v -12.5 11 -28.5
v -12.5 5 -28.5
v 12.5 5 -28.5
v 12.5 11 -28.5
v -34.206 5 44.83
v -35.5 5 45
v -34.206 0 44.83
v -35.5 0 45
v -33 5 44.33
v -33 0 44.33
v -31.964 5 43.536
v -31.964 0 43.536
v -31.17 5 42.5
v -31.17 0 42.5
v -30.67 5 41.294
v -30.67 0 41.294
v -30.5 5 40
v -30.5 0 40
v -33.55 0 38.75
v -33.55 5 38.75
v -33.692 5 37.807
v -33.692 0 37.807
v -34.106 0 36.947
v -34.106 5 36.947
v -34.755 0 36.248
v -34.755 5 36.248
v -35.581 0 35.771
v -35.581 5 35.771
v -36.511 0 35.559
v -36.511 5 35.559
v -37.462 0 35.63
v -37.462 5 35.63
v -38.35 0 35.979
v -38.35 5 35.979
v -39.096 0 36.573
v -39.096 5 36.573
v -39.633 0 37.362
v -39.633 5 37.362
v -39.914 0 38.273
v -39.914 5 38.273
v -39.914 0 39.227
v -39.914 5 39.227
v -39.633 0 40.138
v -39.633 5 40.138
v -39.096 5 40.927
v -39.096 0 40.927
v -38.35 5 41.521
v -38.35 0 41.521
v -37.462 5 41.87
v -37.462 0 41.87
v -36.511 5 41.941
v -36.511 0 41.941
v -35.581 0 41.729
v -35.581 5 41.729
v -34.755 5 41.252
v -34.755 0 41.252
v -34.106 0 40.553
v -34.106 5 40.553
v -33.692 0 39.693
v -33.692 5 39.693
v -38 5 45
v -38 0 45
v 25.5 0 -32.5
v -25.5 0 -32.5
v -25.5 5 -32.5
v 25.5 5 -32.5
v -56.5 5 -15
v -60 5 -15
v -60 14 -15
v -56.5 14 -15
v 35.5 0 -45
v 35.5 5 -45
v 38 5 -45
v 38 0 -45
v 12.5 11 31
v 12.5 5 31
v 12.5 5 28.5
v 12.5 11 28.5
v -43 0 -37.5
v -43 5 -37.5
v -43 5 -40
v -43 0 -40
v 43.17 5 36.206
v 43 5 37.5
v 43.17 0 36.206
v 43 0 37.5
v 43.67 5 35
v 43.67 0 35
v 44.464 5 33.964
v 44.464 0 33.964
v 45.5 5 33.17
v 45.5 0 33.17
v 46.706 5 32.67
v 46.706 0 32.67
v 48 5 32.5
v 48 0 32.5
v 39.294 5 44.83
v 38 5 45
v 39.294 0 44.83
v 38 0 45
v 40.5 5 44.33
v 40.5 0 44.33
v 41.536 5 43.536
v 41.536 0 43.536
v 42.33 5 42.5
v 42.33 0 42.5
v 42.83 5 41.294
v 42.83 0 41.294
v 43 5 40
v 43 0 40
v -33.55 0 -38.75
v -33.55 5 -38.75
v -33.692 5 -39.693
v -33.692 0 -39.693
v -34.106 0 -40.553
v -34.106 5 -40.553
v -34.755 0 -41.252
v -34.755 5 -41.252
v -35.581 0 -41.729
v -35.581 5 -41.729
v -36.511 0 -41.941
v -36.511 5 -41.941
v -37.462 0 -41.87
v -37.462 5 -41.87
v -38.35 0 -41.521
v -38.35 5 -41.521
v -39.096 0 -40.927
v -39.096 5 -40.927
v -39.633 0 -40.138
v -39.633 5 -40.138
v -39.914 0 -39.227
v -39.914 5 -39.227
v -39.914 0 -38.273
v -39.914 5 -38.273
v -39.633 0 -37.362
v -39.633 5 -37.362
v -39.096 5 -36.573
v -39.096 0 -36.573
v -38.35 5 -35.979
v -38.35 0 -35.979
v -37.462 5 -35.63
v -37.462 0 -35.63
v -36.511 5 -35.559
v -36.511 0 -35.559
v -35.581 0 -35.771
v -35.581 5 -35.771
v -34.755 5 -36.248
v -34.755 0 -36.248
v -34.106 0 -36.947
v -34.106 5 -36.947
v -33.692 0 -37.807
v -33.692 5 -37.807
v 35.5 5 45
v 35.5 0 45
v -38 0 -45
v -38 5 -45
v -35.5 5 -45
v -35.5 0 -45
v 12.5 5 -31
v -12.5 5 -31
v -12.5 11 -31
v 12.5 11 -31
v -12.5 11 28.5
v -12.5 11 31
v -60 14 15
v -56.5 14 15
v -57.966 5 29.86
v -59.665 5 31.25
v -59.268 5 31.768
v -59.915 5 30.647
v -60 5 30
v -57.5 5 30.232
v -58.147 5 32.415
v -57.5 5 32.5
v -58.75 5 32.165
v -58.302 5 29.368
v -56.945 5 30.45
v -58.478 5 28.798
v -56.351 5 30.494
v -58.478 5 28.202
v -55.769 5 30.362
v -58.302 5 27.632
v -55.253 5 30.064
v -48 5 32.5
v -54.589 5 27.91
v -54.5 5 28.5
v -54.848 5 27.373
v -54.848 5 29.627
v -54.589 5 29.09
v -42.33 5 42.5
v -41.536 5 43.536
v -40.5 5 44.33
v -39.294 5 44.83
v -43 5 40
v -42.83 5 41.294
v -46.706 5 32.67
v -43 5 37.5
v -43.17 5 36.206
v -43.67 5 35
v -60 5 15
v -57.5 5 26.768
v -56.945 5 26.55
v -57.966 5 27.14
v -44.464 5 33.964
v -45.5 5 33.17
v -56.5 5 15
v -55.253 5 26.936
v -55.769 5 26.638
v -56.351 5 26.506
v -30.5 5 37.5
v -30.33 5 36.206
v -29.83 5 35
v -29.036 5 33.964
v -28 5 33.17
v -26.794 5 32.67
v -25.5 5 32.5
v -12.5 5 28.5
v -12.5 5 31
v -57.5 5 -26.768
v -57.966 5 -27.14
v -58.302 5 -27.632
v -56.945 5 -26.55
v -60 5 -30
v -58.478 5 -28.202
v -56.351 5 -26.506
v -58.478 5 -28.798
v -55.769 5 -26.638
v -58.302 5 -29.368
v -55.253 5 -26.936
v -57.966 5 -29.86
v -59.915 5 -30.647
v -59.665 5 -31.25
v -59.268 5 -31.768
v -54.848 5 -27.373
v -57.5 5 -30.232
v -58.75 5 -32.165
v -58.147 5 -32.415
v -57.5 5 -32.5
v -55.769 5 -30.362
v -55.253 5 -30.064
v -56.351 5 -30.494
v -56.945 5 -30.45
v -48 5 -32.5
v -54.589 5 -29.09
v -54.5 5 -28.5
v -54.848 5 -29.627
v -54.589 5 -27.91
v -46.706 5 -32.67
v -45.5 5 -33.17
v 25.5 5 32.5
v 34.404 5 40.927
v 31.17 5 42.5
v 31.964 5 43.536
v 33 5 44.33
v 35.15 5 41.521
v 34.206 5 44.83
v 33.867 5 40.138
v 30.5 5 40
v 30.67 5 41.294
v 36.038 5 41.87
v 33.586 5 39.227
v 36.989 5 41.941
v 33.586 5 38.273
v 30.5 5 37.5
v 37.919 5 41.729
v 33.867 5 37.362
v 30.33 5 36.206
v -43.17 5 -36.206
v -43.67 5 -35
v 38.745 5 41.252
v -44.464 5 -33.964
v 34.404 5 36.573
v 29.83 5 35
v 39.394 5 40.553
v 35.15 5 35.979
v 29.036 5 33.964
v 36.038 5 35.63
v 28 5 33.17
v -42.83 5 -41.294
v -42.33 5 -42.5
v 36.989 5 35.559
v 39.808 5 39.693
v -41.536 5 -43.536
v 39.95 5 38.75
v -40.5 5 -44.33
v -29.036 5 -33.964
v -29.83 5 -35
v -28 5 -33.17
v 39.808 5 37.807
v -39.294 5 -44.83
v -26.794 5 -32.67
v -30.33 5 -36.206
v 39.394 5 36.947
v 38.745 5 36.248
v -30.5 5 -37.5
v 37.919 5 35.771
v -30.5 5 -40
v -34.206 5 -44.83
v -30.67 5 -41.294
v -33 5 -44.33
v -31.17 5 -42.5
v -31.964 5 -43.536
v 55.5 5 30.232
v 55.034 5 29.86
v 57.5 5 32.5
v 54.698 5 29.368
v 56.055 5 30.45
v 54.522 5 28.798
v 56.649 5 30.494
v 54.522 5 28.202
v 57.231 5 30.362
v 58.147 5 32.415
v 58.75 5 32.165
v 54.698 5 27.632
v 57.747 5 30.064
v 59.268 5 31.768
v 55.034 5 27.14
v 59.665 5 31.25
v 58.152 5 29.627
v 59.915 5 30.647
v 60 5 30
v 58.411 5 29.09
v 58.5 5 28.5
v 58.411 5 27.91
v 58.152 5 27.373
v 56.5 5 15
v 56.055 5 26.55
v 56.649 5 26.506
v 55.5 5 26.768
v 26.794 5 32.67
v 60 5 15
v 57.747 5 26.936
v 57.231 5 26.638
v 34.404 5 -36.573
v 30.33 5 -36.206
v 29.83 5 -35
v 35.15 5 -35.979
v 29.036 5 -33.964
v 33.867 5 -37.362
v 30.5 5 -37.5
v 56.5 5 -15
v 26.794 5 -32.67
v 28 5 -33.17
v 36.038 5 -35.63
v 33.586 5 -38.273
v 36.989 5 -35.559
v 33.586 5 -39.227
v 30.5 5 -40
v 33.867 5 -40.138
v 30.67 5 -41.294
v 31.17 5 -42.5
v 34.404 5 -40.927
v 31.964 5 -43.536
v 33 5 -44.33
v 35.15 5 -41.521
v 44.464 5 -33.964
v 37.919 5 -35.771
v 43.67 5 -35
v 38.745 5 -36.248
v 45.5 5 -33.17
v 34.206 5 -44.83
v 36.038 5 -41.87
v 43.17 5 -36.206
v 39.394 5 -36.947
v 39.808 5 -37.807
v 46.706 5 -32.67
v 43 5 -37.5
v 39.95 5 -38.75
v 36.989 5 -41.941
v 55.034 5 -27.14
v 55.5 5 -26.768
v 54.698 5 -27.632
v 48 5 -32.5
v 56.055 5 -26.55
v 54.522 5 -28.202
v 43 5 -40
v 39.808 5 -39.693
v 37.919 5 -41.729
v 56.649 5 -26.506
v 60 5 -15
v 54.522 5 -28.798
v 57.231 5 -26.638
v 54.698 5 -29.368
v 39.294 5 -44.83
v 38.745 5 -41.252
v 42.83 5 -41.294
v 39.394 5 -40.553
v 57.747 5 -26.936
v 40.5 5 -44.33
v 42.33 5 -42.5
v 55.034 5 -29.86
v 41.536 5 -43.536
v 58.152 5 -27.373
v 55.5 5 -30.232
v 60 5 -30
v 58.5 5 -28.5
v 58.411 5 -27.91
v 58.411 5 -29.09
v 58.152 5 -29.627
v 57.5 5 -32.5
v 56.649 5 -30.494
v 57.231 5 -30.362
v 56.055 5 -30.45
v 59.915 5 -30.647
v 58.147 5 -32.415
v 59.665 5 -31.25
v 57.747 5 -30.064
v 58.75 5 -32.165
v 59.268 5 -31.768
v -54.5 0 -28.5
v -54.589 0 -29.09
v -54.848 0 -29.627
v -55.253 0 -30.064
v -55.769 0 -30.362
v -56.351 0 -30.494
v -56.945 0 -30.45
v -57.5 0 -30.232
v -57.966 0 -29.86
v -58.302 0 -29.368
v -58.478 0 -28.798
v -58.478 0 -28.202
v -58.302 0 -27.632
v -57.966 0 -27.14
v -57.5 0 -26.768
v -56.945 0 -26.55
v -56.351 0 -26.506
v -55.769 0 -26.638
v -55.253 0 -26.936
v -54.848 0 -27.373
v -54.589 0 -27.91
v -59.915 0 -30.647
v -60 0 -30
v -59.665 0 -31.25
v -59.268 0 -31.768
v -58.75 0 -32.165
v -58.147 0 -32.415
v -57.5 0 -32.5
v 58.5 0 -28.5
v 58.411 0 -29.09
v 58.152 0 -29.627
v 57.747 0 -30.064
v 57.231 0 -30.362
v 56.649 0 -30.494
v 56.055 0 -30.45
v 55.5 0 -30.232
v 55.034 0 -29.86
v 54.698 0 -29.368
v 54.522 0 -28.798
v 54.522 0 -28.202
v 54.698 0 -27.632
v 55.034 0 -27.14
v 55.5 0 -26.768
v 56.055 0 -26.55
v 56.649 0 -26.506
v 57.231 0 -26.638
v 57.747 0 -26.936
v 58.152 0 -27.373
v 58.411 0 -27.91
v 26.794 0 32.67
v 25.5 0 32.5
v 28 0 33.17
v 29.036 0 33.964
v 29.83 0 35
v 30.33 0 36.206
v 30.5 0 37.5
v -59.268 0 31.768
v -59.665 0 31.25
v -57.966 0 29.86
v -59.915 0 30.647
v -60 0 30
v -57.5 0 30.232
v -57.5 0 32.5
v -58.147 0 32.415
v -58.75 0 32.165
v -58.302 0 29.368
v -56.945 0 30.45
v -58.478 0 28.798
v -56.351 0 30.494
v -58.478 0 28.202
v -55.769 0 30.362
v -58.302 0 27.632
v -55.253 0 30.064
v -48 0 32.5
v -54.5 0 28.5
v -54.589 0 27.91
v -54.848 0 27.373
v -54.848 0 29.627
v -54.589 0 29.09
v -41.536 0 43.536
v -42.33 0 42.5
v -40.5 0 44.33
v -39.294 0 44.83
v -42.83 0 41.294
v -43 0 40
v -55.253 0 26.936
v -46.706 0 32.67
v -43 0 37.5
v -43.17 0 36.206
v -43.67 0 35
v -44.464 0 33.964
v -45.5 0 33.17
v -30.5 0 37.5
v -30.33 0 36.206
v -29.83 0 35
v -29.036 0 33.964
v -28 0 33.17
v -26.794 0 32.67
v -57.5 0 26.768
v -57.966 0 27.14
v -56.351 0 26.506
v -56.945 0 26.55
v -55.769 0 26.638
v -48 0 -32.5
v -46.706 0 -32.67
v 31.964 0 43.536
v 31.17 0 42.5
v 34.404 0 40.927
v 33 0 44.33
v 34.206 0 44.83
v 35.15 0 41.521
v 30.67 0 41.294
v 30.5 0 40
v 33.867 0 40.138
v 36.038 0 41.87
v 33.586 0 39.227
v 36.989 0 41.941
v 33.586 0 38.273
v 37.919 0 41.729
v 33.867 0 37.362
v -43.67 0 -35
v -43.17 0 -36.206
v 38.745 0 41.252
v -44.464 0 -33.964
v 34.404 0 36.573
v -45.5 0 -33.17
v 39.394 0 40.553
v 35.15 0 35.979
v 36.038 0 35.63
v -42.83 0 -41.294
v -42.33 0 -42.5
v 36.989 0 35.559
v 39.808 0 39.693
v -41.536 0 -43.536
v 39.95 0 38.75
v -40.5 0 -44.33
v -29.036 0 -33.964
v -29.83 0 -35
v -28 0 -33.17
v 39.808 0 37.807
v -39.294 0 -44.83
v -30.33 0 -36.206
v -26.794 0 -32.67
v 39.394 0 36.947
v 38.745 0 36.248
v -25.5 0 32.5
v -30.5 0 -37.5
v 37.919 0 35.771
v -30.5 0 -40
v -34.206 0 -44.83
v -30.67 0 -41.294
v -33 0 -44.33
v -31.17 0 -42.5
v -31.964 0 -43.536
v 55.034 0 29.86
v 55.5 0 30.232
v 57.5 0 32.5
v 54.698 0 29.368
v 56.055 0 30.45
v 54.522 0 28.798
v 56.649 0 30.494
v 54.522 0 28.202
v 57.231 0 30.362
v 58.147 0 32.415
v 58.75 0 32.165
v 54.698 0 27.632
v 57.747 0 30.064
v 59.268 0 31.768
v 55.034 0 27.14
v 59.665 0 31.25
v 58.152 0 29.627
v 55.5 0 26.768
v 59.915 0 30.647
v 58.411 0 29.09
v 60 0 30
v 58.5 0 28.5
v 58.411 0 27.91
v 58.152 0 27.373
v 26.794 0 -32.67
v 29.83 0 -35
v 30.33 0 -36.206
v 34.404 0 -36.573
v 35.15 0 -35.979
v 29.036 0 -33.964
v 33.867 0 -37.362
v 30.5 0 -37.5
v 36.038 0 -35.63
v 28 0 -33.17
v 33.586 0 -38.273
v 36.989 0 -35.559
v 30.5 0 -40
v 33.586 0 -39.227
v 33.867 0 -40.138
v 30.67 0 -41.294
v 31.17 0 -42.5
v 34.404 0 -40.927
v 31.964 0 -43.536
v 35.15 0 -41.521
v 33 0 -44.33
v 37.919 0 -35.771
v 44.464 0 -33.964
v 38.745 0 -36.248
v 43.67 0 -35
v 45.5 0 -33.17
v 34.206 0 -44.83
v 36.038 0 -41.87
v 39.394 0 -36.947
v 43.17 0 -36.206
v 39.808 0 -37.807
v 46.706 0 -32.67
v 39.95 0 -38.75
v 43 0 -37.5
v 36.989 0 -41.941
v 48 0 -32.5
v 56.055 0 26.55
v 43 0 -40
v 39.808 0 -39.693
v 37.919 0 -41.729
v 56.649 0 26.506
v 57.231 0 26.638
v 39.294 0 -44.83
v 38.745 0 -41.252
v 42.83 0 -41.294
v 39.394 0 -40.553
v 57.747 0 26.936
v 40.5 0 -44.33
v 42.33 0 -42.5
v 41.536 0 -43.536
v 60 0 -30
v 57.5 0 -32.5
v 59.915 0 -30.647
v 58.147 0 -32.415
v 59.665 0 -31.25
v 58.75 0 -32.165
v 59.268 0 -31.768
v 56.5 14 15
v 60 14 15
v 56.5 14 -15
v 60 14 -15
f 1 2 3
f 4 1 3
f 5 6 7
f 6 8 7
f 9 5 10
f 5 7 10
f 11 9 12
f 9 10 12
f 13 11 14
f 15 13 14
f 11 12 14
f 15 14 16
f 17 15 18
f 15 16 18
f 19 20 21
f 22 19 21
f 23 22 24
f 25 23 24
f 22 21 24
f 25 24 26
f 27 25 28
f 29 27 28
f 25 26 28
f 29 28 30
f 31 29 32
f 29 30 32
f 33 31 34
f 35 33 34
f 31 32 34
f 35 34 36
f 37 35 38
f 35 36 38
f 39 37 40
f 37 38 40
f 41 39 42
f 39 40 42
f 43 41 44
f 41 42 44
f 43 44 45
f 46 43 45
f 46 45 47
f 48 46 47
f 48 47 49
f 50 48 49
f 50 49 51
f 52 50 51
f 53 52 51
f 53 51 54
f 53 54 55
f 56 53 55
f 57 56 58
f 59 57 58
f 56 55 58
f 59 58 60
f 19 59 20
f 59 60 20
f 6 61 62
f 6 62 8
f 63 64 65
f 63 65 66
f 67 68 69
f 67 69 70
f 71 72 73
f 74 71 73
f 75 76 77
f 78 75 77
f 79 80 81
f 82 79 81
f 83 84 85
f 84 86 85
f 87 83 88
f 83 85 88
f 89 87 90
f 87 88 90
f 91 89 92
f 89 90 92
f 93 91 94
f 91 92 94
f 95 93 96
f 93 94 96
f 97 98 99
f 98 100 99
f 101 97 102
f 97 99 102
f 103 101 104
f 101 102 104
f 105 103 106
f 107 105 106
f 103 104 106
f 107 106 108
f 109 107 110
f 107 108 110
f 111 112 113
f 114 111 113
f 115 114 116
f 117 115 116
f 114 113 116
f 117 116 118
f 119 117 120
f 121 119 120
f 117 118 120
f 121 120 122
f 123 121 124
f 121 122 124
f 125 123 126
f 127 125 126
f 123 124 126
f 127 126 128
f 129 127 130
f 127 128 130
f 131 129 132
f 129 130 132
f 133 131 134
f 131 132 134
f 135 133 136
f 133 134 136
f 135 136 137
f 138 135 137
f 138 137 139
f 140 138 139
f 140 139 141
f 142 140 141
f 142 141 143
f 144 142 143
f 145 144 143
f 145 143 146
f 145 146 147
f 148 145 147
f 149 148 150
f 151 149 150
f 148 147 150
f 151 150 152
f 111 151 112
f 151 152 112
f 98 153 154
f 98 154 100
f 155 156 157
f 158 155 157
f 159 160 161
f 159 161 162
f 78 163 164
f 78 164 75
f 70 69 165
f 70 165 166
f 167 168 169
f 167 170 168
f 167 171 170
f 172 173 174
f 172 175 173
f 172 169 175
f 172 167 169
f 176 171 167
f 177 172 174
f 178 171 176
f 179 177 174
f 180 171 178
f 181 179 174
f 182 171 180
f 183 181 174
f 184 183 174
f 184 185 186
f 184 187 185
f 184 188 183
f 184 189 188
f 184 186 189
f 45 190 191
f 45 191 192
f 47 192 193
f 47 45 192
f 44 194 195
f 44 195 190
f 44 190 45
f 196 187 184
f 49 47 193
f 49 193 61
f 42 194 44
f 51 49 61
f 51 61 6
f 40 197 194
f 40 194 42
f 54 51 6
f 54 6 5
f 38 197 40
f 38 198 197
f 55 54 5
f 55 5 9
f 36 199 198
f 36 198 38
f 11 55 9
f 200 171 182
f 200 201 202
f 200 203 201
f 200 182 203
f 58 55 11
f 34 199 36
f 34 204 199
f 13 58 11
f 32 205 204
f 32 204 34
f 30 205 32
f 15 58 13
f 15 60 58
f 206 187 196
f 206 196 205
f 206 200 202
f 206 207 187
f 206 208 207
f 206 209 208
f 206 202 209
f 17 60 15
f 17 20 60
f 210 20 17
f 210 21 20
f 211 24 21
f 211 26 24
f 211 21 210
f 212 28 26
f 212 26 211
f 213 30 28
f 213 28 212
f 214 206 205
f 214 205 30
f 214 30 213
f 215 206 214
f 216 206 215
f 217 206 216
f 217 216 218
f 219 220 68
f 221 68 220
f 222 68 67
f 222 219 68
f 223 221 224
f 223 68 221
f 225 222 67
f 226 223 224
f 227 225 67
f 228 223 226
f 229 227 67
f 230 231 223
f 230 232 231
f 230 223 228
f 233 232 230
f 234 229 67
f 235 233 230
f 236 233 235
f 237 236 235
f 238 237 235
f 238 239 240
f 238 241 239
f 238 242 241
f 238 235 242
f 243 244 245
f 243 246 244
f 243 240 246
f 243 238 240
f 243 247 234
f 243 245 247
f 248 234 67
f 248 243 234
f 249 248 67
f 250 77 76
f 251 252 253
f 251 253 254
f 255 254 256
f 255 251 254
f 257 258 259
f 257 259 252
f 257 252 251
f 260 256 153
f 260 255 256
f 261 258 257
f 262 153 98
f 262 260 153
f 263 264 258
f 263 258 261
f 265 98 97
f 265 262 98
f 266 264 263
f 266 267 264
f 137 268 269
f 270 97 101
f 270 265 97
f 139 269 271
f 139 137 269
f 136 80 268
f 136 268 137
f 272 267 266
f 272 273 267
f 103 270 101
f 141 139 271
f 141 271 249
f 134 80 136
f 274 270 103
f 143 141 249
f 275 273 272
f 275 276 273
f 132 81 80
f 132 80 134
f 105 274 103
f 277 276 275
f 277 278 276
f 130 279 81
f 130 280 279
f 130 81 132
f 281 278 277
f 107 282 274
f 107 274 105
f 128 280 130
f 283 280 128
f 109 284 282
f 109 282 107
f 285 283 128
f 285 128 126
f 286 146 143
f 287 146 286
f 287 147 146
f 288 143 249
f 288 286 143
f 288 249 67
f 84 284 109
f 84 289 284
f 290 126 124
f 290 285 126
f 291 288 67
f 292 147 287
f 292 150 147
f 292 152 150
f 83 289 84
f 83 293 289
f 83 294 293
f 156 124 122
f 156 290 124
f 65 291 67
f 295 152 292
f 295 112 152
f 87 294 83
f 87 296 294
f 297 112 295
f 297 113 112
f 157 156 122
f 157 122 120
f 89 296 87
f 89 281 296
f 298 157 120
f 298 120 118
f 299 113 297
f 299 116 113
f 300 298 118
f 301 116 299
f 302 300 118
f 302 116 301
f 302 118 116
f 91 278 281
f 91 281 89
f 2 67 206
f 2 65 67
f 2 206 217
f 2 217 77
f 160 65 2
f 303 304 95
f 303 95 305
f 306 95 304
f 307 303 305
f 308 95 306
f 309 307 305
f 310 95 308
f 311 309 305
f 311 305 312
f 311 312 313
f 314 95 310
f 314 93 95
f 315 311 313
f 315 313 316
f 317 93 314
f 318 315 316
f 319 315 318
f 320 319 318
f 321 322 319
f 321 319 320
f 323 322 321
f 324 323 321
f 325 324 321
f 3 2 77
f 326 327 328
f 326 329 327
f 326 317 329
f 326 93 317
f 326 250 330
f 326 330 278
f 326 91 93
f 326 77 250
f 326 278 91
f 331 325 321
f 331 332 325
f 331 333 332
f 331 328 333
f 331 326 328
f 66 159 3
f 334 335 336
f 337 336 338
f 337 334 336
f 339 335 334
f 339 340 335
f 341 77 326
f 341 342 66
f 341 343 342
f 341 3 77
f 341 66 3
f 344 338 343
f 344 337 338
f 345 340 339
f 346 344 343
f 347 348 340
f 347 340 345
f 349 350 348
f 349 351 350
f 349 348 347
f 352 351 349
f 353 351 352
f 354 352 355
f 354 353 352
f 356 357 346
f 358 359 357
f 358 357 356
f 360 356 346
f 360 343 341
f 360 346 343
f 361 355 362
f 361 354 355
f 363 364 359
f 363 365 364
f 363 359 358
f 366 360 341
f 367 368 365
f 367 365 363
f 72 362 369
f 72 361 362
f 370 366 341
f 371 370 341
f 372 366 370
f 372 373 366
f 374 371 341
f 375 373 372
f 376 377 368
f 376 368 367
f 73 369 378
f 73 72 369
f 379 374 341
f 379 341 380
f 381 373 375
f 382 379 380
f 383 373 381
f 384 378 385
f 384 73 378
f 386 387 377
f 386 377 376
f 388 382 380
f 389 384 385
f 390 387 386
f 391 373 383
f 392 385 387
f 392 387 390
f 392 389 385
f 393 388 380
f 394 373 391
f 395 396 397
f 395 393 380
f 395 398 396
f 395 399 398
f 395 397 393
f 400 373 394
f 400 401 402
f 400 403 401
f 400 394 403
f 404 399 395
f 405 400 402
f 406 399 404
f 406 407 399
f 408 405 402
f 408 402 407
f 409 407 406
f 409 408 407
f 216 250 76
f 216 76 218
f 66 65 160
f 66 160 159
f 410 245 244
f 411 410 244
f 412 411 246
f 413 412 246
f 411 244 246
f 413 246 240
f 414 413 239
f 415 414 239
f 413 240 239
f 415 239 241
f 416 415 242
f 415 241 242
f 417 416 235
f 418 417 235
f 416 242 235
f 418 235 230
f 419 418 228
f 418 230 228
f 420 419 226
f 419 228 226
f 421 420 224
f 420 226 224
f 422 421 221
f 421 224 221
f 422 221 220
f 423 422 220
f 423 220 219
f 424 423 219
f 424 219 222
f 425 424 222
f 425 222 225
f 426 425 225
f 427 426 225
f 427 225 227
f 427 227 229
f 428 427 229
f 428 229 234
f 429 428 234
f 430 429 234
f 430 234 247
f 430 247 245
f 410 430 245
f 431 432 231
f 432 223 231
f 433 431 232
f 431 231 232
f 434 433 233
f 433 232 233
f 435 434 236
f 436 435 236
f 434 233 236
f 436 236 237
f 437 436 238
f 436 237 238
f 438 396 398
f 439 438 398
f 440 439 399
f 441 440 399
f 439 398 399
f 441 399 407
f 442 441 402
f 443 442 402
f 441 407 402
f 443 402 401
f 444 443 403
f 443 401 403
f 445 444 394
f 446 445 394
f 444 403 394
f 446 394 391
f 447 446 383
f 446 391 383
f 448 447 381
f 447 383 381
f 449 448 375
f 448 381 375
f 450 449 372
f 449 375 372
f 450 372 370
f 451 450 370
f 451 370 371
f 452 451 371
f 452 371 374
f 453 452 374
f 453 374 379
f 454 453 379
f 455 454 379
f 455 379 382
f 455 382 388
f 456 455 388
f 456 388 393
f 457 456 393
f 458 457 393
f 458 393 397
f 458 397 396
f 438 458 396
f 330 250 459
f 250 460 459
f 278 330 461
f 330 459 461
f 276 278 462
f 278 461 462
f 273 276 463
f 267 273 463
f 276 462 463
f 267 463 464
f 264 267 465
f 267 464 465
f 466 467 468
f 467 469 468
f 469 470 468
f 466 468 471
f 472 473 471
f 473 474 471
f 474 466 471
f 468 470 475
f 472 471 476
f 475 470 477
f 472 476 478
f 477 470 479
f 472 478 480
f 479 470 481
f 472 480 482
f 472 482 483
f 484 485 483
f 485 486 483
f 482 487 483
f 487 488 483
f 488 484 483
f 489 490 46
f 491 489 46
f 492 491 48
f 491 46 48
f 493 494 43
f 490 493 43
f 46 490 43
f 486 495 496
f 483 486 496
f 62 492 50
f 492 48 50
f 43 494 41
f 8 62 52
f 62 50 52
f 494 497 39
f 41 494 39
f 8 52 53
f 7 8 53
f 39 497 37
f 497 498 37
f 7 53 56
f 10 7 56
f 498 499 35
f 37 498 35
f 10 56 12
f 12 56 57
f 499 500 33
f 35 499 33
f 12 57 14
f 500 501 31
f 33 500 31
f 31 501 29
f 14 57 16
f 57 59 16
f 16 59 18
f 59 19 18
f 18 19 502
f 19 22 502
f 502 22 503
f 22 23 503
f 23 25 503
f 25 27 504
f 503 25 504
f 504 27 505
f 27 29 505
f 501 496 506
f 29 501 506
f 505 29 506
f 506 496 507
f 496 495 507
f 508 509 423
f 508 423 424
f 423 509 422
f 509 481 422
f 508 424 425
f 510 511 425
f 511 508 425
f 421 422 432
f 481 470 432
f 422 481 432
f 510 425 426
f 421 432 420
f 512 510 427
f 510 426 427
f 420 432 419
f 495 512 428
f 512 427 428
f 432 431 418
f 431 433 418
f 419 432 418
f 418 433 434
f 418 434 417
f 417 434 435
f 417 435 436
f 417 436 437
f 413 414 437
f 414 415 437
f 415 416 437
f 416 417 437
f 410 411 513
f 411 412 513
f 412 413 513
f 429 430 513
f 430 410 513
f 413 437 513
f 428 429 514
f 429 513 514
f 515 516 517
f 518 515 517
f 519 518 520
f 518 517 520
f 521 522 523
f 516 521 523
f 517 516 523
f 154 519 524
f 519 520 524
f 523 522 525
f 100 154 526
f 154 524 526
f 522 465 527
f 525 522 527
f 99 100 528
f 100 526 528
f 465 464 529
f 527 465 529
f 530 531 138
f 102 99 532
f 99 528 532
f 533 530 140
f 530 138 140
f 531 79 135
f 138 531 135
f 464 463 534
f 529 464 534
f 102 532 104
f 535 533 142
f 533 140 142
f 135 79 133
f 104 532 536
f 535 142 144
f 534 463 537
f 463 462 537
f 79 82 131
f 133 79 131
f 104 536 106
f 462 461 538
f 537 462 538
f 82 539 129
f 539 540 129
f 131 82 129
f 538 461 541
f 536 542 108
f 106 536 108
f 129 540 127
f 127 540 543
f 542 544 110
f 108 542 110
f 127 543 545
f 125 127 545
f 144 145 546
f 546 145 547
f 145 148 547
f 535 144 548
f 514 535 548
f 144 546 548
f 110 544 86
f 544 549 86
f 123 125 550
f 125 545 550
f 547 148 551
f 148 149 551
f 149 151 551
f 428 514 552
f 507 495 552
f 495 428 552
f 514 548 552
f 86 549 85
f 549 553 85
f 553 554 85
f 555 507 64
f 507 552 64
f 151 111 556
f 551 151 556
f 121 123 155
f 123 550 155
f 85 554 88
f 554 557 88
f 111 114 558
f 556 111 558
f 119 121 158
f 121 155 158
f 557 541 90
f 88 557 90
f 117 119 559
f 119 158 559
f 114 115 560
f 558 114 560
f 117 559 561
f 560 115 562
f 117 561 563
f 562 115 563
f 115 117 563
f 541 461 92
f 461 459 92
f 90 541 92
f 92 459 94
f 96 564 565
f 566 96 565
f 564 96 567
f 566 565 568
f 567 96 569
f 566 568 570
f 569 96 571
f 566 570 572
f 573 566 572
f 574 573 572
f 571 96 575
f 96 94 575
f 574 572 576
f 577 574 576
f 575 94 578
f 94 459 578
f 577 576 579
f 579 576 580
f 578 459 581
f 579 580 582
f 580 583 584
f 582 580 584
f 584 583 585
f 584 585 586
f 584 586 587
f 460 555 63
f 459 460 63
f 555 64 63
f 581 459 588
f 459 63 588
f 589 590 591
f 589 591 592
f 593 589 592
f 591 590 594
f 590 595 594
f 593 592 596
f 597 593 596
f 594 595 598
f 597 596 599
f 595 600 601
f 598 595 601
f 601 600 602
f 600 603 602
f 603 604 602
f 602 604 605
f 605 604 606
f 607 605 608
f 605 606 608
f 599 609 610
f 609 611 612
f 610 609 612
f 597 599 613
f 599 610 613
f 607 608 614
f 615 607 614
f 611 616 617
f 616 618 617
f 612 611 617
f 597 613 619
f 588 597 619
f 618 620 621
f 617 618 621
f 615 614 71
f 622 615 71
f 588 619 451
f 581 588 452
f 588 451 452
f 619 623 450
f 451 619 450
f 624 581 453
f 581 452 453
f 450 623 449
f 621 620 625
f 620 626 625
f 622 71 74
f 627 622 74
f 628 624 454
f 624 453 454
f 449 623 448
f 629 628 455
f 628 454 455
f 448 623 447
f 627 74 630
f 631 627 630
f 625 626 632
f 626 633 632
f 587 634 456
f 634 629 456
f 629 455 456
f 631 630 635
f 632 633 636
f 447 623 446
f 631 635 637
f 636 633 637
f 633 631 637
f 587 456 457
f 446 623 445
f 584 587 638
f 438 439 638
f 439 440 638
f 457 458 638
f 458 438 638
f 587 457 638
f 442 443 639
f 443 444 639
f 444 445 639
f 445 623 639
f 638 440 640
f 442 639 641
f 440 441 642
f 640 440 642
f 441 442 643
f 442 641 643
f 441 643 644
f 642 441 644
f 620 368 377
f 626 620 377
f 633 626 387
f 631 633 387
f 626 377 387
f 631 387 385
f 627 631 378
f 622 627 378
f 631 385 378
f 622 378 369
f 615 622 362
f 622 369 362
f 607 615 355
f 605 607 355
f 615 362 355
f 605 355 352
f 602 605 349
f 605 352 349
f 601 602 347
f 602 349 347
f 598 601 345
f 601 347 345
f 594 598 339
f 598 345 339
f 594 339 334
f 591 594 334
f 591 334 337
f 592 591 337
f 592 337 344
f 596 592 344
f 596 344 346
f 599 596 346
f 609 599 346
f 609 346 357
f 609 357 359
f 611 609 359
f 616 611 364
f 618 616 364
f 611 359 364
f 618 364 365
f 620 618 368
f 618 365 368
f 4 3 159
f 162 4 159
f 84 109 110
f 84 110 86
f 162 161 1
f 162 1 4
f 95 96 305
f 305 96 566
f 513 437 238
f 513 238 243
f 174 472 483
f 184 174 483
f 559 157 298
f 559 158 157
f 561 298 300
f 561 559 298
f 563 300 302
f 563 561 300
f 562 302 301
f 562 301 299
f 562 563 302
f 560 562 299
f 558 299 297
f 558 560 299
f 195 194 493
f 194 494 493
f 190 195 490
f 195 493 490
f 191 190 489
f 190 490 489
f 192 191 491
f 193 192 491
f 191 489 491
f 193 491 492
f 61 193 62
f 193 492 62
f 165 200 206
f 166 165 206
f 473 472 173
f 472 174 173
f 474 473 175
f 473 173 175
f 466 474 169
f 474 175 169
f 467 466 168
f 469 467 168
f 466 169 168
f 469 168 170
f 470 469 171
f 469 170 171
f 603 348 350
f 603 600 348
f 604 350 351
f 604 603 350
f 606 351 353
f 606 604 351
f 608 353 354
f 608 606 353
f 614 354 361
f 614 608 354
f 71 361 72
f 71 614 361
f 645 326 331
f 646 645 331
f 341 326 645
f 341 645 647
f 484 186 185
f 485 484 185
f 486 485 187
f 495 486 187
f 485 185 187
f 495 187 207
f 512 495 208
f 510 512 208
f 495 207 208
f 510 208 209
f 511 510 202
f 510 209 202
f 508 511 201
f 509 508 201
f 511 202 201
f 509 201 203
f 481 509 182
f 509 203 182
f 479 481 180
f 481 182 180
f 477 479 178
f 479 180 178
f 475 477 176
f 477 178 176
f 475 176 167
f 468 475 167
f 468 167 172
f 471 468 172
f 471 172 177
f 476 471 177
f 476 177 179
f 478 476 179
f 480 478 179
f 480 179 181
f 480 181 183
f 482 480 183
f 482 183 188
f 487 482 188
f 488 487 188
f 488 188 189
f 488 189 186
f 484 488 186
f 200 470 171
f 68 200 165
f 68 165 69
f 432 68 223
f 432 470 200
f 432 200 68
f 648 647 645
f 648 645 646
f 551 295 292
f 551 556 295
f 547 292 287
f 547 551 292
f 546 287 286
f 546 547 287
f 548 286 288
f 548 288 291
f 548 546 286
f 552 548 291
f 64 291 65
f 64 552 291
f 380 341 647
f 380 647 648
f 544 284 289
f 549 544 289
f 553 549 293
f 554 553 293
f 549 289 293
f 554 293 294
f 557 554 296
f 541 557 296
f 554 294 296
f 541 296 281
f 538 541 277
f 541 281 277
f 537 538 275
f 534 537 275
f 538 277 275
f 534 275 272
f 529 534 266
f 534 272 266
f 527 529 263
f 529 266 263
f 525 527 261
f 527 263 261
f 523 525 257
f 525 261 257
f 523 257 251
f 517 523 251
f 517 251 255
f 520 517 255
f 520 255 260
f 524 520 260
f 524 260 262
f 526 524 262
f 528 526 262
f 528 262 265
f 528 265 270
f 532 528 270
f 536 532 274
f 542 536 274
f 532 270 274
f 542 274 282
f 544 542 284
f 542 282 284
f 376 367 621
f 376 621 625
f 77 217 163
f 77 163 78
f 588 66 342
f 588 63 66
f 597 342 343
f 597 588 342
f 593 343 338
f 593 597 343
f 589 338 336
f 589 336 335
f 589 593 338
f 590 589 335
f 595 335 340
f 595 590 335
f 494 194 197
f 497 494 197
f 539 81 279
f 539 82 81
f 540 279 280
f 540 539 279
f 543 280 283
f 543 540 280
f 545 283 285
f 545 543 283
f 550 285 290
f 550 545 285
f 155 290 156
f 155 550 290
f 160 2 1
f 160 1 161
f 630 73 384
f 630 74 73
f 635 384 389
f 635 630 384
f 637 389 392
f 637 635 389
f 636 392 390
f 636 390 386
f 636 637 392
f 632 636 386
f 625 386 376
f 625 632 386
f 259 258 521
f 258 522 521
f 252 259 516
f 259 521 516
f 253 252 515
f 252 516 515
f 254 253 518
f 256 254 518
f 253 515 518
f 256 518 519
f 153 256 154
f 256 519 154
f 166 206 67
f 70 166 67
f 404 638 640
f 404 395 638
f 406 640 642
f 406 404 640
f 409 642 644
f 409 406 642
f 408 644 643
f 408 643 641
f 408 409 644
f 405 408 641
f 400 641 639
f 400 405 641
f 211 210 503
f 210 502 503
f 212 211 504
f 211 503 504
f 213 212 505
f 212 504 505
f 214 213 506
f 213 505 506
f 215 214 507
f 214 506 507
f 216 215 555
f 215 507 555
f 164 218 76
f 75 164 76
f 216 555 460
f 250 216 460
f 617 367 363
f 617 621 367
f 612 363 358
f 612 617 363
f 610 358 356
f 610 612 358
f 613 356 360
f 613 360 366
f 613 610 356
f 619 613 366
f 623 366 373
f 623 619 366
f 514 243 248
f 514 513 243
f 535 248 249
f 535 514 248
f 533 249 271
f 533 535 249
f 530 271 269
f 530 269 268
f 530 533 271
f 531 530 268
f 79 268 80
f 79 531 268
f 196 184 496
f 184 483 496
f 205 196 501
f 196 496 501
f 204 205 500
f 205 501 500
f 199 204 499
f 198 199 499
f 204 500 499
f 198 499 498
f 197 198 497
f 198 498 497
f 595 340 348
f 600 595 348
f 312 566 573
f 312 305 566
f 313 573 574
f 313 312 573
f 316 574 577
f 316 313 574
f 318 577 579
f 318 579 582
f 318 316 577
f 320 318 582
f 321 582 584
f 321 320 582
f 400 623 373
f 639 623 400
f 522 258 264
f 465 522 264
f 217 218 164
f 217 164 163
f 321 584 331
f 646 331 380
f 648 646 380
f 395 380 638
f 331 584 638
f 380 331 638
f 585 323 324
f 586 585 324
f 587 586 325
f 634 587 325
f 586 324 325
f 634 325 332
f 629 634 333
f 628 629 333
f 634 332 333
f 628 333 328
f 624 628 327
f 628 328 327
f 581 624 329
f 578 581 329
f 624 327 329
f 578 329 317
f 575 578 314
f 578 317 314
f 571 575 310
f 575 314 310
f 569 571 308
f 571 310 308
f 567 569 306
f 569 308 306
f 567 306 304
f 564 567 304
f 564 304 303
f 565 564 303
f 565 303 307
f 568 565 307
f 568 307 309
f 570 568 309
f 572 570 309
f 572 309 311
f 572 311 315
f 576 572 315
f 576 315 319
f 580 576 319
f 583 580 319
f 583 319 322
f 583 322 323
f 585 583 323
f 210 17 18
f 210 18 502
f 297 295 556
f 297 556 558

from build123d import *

# Parameters (mm, degrees)
SKETCH_1_W          = 120
SKETCH_1_H          = 65
EXTRUDE_1_DEPTH     = 5
SKETCH_2_W          = 12.5
SKETCH_2_H          = 12.5
EXTRUDE_2_DEPTH     = 5
SKETCH_3_R          = 3.2
CUT_EXTRUDE_1_DEPTH = 5
SKETCH_4_W          = 3.5
SKETCH_4_H          = 30
EXTRUDE_3_DEPTH     = 9
FILLET_1_R          = 5
FILLET_2_R          = 2.5
SKETCH_5_W          = 25
SKETCH_5_H          = 2.5
EXTRUDE_4_DEPTH     = 6
SKETCH_6_R          = 2
CUT_EXTRUDE_2_DEPTH = 10


with BuildPart() as part:
    # 草图1 → 凸台-拉伸1 (new body)
    with BuildSketch(Plane(origin=(0, 0, 0), x_dir=(1, 0, 0), z_dir=(0, 1, 0))):
        Rectangle(SKETCH_1_W, SKETCH_1_H)
    extrude(amount=EXTRUDE_1_DEPTH)

    # 草图2 → 凸台-拉伸2 (add)
    with BuildSketch(Plane(origin=(0, 5, 0), x_dir=(1, 0, 0), z_dir=(0, 1, 0))):
        with Locations((-36.75, 38.75)):
            Rectangle(SKETCH_2_W, SKETCH_2_H)
        with Locations((36.75, 38.75)):
            Rectangle(SKETCH_2_W, SKETCH_2_H)
        with Locations((36.75, -38.75)):
            Rectangle(SKETCH_2_W, SKETCH_2_H)
        with Locations((-36.75, -38.75)):
            Rectangle(SKETCH_2_W, SKETCH_2_H)
    extrude(amount=-EXTRUDE_2_DEPTH)

    # 草图3 → 切除-拉伸1 (cut)
    with BuildSketch(Plane(origin=(0, 5, 0), x_dir=(1, 0, 0), z_dir=(0, 1, 0))):
        with Locations((-36.75, 38.75)):
            Circle(SKETCH_3_R)
        with Locations((36.75, 38.75)):
            Circle(SKETCH_3_R)
        with Locations((36.75, -38.75)):
            Circle(SKETCH_3_R)
        with Locations((-36.75, -38.75)):
            Circle(SKETCH_3_R)
    extrude(amount=-CUT_EXTRUDE_1_DEPTH, mode=Mode.SUBTRACT)

    # 草图4 → 凸台-拉伸3 (add)
    with BuildSketch(Plane(origin=(0, 5, 0), x_dir=(1, 0, 0), z_dir=(0, 1, 0))):
        with Locations((-58.25, 0)):
            Rectangle(SKETCH_4_W, SKETCH_4_H)
        with Locations((58.25, 0)):
            Rectangle(SKETCH_4_W, SKETCH_4_H)
    extrude(amount=EXTRUDE_3_DEPTH)

    # 圆角1
    fillet_1_edges = [part.edges().sort_by_distance(p)[0] for p in [
        (-43, 2.5, -32.5),
        (-43, 2.5, -45),
        (-30.5, 2.5, -45),
        (-30.5, 2.5, -32.5),
        (43, 2.5, -32.5),
        (30.5, 2.5, -32.5),
        (30.5, 2.5, -45),
        (43, 2.5, -45),
        (30.5, 2.5, 32.5),
        (43, 2.5, 32.5),
        (43, 2.5, 45),
        (30.5, 2.5, 45),
        (-43, 2.5, 32.5),
        (-30.5, 2.5, 32.5),
        (-30.5, 2.5, 45),
        (-43, 2.5, 45),
    ]]
    fillet(fillet_1_edges, radius=FILLET_1_R)

    # 圆角2
    fillet_2_edges = [part.edges().sort_by_distance(p)[0] for p in [
        (60, 2.5, 32.5),
        (-60, 2.5, 32.5),
        (-60, 2.5, -32.5),
        (60, 2.5, -32.5),
    ]]
    fillet(fillet_2_edges, radius=FILLET_2_R)

    # 草图5 → 凸台-拉伸4 (add)
    with BuildSketch(Plane(origin=(0, 5, 0), x_dir=(1, 0, 0), z_dir=(0, 1, 0))):
        with Locations((0, 29.75)):
            Rectangle(SKETCH_5_W, SKETCH_5_H)
        with Locations((0, -29.75)):
            Rectangle(SKETCH_5_W, SKETCH_5_H)
    extrude(amount=EXTRUDE_4_DEPTH)

    # 草图6 → 切除-拉伸2 (cut)
    with BuildSketch(Plane(origin=(0, 5, 0), x_dir=(1, 0, 0), z_dir=(0, 1, 0))):
        with Locations((-56.5, 28.5)):
            Circle(SKETCH_6_R)
        with Locations((56.5, 28.5)):
            Circle(SKETCH_6_R)
        with Locations((56.5, -28.5)):
            Circle(SKETCH_6_R)
        with Locations((-56.5, -28.5)):
            Circle(SKETCH_6_R)
    extrude(amount=-CUT_EXTRUDE_2_DEPTH, mode=Mode.SUBTRACT)


solid = part.part
